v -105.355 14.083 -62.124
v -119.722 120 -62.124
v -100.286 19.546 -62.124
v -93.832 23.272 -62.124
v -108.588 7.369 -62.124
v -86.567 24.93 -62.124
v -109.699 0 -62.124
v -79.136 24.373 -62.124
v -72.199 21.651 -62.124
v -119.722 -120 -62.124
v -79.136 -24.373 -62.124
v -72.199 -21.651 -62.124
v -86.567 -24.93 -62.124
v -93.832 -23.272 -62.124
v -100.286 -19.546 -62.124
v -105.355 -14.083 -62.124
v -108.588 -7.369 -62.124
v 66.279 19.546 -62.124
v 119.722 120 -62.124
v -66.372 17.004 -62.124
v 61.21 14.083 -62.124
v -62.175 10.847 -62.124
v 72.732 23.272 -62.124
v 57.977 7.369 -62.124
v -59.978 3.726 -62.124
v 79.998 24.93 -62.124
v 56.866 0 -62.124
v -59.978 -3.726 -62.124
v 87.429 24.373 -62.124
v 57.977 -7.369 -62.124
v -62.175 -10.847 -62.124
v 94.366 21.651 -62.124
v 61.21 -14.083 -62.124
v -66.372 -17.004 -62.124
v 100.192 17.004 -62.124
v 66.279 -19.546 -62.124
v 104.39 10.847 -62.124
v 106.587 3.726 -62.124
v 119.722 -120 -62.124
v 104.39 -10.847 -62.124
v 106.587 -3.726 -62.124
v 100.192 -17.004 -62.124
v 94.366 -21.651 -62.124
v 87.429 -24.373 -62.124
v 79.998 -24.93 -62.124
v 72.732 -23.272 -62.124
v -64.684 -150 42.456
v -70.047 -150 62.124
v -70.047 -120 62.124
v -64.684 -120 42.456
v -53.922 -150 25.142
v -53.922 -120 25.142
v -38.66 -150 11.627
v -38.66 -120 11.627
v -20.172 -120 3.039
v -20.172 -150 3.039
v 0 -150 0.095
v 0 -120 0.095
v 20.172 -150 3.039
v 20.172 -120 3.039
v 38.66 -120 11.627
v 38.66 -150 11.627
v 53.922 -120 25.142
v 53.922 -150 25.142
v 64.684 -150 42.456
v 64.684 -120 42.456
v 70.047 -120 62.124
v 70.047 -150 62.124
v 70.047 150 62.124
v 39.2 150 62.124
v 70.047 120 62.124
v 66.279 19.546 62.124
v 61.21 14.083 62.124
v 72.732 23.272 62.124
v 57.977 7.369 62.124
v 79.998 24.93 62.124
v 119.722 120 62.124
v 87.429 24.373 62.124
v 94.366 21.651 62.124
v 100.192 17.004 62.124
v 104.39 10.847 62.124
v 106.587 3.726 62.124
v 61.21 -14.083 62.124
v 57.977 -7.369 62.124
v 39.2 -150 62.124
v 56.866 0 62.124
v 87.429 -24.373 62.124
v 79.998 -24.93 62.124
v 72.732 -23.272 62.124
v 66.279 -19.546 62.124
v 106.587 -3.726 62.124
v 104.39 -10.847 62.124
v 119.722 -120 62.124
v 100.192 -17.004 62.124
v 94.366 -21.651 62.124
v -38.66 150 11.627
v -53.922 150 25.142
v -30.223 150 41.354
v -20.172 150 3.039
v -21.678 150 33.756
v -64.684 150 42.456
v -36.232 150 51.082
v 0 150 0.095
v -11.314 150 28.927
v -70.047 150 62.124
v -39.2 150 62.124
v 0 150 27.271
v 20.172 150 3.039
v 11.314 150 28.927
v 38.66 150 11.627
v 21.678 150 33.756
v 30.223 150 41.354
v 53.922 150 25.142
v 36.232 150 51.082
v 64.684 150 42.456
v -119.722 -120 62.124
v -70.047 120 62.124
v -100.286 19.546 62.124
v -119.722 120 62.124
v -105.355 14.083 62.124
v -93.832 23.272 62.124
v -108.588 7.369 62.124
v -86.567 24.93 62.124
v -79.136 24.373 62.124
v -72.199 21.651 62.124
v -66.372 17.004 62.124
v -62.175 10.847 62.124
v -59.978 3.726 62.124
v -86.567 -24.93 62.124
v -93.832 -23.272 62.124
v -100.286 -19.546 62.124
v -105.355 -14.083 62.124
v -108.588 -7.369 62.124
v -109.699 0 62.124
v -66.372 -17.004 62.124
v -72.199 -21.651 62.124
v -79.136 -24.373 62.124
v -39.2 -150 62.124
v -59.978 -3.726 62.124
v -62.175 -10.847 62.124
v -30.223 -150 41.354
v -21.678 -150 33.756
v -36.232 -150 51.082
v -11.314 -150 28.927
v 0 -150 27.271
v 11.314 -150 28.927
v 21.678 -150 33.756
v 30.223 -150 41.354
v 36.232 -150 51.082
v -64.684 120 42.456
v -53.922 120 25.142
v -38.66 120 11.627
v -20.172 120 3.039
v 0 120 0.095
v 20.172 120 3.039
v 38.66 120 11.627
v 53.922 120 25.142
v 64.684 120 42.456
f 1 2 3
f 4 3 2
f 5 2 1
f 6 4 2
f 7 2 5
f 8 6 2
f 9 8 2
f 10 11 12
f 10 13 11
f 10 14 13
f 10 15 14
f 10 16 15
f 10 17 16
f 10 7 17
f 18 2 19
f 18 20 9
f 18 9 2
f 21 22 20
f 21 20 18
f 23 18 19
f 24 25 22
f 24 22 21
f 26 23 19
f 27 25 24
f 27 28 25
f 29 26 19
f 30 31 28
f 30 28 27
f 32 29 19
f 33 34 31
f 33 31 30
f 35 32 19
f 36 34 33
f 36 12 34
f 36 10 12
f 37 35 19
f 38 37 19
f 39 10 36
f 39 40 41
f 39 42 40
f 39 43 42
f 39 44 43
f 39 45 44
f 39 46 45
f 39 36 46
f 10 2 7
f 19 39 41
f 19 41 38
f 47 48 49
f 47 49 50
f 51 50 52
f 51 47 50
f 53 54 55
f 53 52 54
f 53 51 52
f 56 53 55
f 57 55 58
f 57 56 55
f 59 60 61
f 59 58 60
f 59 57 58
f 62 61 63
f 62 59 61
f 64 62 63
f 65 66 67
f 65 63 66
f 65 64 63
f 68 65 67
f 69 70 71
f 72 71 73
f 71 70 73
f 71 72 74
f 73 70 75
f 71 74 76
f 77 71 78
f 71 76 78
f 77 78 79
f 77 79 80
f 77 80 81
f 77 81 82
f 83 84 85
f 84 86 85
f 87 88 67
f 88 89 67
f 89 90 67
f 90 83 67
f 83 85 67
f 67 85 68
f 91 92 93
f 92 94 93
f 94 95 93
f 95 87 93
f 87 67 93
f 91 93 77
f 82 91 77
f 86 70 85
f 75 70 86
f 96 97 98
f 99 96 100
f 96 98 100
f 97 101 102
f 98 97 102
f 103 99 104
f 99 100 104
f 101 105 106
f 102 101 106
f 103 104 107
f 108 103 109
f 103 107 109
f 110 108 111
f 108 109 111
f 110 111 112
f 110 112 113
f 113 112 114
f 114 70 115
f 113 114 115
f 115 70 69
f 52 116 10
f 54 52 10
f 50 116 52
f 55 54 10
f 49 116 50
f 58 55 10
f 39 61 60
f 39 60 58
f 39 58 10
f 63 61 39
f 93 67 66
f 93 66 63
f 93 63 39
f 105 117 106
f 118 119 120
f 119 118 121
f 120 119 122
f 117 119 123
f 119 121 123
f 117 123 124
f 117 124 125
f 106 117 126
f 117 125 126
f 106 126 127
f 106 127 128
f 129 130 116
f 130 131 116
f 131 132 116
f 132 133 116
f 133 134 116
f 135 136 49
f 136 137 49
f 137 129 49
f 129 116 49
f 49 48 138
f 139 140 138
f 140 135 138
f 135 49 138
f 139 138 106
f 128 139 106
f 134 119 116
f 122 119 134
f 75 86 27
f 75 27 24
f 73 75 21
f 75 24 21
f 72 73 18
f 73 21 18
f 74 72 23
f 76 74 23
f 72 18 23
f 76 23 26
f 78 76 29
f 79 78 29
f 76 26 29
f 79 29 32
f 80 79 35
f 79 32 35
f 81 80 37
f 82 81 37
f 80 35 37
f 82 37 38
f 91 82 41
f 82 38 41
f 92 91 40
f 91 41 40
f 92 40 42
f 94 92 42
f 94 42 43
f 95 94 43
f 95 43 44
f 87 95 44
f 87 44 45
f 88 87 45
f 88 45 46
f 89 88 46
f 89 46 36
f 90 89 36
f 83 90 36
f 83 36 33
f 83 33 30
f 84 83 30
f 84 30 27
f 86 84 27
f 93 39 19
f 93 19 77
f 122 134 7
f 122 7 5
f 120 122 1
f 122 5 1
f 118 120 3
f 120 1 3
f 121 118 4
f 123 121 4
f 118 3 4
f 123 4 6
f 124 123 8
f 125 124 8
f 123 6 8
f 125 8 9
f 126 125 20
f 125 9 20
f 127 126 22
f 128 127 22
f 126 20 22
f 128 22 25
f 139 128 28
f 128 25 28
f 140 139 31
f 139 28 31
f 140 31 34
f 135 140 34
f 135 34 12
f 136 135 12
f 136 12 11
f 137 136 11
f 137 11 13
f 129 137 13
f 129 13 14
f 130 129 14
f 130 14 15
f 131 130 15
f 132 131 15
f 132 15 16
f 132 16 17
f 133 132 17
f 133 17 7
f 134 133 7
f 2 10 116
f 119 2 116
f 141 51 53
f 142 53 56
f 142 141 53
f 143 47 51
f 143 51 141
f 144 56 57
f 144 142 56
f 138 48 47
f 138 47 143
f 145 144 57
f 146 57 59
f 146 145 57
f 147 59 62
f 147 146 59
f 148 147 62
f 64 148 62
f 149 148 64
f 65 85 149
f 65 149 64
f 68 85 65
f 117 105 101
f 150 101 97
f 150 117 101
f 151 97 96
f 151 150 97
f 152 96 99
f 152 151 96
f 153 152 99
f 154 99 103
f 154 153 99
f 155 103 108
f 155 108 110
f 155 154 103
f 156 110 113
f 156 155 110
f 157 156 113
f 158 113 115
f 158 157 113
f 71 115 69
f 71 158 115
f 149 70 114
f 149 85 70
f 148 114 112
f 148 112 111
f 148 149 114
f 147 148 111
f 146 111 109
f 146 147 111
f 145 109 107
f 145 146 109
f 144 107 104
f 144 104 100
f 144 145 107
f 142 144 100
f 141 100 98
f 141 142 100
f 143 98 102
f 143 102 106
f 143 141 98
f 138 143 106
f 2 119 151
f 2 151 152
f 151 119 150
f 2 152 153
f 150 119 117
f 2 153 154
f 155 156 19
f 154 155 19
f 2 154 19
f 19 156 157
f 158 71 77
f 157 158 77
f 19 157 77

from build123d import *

# Parameters (mm, degrees)
F1_DEPTH      = 150
F1_DEPTH_BACK = 150
F0_W          = 49.675524
F0_H          = 124.247186
F2_DEPTH      = 120
F2_DEPTH_BACK = 120
F4_D          = 50
F5_D          = 50


with BuildPart() as f1:
    # F0 (on Front) → F1 (new body, two sides)
    with BuildSketch(Plane.XZ) as f1_sk:
        with BuildLine():
            Line((-39.200012, 62.123593), (-70.046909, 62.123593))
            ThreePointArc((-70.046909, 62.123593), (0, 0.094575), (70.046909, 62.123593))
            Line((70.046909, 62.123593), (39.200012, 62.123593))
            Line((39.200012, 62.123593), (39.200012, 26.869994))
            Line((39.200012, 26.869994), (-39.200012, 26.869994))
            Line((-39.200012, 26.869994), (-39.200012, 62.123593))
        make_face()
        with BuildLine():
            ThreePointArc((39.200012, 62.123593), (0, 27.270557), (-39.200012, 62.123593))
            Line((-39.200012, 62.123593), (-39.200012, 26.869994))
            Line((-39.200012, 26.869994), (39.200012, 26.869994))
            Line((39.200012, 26.869994), (39.200012, 62.123593))
        make_face()
    extrude(amount=F1_DEPTH)
    extrude(f1_sk.sketch, amount=-F1_DEPTH_BACK)

    # F0 (on Front) → F2 (join, two sides)
    with BuildSketch(Plane.XZ) as f2_sk:
        with Locations((-94.884671, 0)):
            Rectangle(F0_W, F0_H)
        with BuildLine():
            ThreePointArc((70.046909, 62.123593), (0, 0.094575), (-70.046909, 62.123593))
            Line((-70.046909, 62.123593), (-70.046909, -62.123593))
            Line((-70.046909, -62.123593), (70.046909, -62.123593))
            Line((70.046909, -62.123593), (70.046909, 62.123593))
        make_face()
        with Locations((94.884671, 0)):
            Rectangle(F0_W, F0_H)
    extrude(amount=F2_DEPTH)
    extrude(f2_sk.sketch, amount=-F2_DEPTH_BACK)

    # F4 (through all)
    with Locations(Plane.XY):
        with Locations((-84.698744, 0), (81.866011, 0)):
            Hole(F4_D / 2)

    # F5 (through all)
    with Locations(Plane(origin=(0, 0, 0), x_dir=(1, 0, 0), z_dir=(0, 0, -1))):
        with Locations((-84.698744, 0), (81.866011, 0)):
            Hole(F5_D / 2)


solid = f1.part
